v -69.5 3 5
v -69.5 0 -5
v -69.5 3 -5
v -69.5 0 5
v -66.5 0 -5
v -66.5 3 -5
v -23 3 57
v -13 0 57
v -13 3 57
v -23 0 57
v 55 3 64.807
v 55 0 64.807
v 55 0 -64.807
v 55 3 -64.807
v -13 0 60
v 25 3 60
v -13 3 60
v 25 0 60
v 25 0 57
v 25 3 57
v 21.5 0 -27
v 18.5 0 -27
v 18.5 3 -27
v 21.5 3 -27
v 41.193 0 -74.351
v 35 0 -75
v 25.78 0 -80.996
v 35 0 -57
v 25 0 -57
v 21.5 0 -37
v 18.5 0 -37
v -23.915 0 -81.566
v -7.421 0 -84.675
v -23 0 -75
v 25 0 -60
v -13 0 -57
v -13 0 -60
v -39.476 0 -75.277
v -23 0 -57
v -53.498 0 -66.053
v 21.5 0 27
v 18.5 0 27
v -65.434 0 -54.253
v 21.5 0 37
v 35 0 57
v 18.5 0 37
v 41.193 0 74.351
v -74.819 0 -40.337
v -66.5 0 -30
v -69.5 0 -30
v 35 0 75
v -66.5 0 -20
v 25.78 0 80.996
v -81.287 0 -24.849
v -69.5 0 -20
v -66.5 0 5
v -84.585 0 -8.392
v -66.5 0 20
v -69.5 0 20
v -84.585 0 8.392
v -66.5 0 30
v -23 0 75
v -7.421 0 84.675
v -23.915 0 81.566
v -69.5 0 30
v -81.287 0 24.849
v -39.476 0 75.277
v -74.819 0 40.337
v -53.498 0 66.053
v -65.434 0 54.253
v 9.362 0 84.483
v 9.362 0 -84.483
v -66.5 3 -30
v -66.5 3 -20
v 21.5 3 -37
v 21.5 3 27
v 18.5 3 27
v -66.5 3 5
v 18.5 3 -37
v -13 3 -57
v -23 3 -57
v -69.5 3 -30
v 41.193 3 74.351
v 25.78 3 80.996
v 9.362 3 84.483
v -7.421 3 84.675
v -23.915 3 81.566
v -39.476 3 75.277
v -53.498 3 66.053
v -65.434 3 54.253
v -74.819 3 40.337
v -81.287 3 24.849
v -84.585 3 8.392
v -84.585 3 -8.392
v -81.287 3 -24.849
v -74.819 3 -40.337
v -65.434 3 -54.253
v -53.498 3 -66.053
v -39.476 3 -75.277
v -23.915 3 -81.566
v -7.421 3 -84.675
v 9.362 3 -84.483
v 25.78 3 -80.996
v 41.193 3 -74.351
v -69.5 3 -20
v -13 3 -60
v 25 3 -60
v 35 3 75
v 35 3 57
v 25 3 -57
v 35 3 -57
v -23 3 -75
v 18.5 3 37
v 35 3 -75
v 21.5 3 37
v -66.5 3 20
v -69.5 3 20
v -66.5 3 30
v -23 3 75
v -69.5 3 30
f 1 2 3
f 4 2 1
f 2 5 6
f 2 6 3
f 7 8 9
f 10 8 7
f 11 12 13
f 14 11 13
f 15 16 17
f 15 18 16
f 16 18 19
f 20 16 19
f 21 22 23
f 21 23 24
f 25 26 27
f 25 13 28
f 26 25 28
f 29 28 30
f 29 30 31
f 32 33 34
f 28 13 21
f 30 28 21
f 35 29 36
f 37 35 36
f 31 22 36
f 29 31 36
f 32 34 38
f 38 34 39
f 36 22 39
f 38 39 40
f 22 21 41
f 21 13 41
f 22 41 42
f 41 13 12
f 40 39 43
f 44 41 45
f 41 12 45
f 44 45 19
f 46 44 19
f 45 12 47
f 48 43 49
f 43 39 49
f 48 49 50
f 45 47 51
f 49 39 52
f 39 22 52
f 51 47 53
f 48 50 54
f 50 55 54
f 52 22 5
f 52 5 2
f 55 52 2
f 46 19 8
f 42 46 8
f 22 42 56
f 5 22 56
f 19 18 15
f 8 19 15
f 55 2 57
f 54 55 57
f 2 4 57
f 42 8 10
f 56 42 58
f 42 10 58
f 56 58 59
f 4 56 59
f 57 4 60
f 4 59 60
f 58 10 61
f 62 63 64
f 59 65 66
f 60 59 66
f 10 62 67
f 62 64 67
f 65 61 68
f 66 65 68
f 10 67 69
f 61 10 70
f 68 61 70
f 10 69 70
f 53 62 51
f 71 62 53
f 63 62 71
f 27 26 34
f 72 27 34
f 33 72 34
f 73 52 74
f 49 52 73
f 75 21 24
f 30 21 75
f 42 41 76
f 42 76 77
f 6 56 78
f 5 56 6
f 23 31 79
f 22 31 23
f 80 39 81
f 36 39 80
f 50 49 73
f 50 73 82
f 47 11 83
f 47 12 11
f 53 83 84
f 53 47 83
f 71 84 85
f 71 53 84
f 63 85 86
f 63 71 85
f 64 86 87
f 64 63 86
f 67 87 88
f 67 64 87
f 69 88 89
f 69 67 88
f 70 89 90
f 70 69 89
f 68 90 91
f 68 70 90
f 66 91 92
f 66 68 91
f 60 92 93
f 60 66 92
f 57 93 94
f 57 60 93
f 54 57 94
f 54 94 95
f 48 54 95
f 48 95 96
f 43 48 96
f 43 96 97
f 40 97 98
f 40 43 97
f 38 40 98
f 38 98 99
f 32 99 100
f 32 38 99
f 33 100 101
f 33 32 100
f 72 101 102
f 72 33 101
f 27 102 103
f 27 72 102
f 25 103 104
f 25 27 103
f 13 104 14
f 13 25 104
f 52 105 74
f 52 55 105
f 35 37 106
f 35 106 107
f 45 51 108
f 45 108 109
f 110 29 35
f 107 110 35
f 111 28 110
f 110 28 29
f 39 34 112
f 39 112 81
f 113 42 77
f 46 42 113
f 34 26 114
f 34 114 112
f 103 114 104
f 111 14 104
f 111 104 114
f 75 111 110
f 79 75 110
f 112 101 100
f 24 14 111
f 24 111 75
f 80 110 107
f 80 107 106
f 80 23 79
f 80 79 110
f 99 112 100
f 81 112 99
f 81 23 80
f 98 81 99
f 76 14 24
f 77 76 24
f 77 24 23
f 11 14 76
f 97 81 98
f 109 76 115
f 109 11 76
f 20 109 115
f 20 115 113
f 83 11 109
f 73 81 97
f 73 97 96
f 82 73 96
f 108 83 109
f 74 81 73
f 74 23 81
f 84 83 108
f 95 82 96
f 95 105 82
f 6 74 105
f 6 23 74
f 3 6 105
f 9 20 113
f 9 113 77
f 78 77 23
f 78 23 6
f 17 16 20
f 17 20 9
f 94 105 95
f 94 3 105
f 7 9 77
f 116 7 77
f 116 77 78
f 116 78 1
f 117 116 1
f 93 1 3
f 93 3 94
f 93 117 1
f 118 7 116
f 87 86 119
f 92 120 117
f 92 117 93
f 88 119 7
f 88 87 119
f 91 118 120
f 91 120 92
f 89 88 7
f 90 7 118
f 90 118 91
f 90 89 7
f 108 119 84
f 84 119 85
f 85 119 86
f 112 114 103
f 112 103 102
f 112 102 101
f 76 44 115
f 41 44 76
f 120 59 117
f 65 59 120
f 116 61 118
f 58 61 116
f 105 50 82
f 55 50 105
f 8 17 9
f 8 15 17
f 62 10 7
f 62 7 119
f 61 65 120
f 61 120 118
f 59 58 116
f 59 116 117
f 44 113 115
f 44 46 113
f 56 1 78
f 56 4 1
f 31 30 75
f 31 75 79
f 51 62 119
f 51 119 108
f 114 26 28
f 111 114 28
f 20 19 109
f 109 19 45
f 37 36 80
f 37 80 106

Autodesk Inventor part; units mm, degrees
ref_plane "YZ Plane" through (0, 0, 0) normal (1, 0, 0) x (0, 1, 0)
ref_plane "XZ Plane" through (0, 0, 0) normal (0, 1, 0) x (-1, 0, 0)
ref_plane "XY Plane" through (0, 0, 0) normal (0, 0, 1) x (1, 0, 0)
sketch "Sketch1" plane through (0, 0, 0) normal (0, 1, 0) x (-1, 0, 0)
  circle A0 centre (0, 0) radius 85
  line L0 (-55, 64.8074) -> (-55, -64.8074)
  line L1 (23, 75) -> (-35, 75)
  line L2 (-35, 75) -> (-35, 60)
  line L3 (-35, 60) -> (23, 60)
  line L4 (23, 60) -> (23, 75)
  line L5 (-6, 60) -> (-6, 30.4166)
  line L6 (23, -60) -> (-35, -60)
  line L7 (-35, -60) -> (-35, -75)
  line L8 (-35, -75) -> (23, -75)
  line L9 (23, -75) -> (23, -60)
  dimension "d0" = 170
  dimension "d1" = 55
  dimension "d2" = 58
  dimension "d3" = 15
  dimension "d4" = 49
  dimension "d5" = 60
  dimension "d8" = 60
extrude "Extrusion1" add sketch "Sketch1" along normal blind 3 contours A0 L0 picked at (43.6667, 0)
sketch "Sketch2" plane through (0, 0, 0) normal (0, -1, 0) x (1, 0, 0)
  line L0 (-23, 60) -> (-13, 60)
  line L1 (-13, 60) -> (-13, 57)
  line L2 (-13, 57) -> (-23, 57)
  line L3 (-23, 57) -> (-23, 60)
  line L4 (35, 60) -> (25, 60)
  line L5 (25, 60) -> (25, 57)
  line L6 (25, 57) -> (35, 57)
  line L7 (35, 57) -> (35, 60)
  point P0 (0, 0)
  dimension "d9" = 10
  dimension "d10" = 3
  dimension "d11" = 10
  dimension "d12" = 3
extrude "Extrusion2" cut sketch "Sketch2" against normal blind 3
sketch "Sketch3" plane through (0, 0, 0) normal (0, -1, 0) x (1, 0, 0)
  line L0 (18.5, 37) -> (21.5, 37)
  line L1 (21.5, 37) -> (21.5, 27)
  line L2 (21.5, 27) -> (18.5, 27)
  line L3 (18.5, 27) -> (18.5, 37)
  line L4 (35, 57) -> (25, 57) projected
  line L5 (-13, 60) -> (25, 60) construction
  line L6 (6, 60) -> (6, 41.1412) construction
  point P0 (0, 0)
  dimension "d15" = 3
  dimension "d16" = 10
  dimension "d17" = 20
  dimension "d18" = 12.5
extrude "Extrusion3" cut sketch "Sketch3" against normal blind 3
sketch "Sketch4" plane through (0, 0, 0) normal (0, -1, 0) x (1, 0, 0)
  line L0 (-69.5, 30) -> (-66.5, 30)
  line L1 (-66.5, 30) -> (-66.5, 20)
  line L2 (-66.5, 20) -> (-69.5, 20)
  line L3 (-69.5, 20) -> (-69.5, 30)
  line L4 (55, 64.8074) -> (55, -64.8074) projected
  line L5 (-69.5, 5) -> (-66.5, 5)
  line L6 (-66.5, 5) -> (-66.5, -5)
  line L7 (-66.5, -5) -> (-69.5, -5)
  line L8 (-69.5, -5) -> (-69.5, 5)
  point P0 (0, 0)
  point P1 (-69.5, 0)
  dimension "d21" = 3
  dimension "d22" = 10
  dimension "d23" = 124.5
  dimension "d24" = 30
  dimension "d25" = 3
  dimension "d26" = 10
extrude "Extrusion4" cut sketch "Sketch4" against normal blind 3
mirror "Mirror1" about plane through (0, 0, 0) normal (0, 0, 1) of "Extrusion3", "Extrusion2", "Extrusion4"
sketch "Sketch5" plane through (0, 0, 0) normal (0, -1, 0) x (1, 0, 0)
  point P0 (0, 0)
equation "\"d8\" = d5"
properties part number "Mid Plate"
